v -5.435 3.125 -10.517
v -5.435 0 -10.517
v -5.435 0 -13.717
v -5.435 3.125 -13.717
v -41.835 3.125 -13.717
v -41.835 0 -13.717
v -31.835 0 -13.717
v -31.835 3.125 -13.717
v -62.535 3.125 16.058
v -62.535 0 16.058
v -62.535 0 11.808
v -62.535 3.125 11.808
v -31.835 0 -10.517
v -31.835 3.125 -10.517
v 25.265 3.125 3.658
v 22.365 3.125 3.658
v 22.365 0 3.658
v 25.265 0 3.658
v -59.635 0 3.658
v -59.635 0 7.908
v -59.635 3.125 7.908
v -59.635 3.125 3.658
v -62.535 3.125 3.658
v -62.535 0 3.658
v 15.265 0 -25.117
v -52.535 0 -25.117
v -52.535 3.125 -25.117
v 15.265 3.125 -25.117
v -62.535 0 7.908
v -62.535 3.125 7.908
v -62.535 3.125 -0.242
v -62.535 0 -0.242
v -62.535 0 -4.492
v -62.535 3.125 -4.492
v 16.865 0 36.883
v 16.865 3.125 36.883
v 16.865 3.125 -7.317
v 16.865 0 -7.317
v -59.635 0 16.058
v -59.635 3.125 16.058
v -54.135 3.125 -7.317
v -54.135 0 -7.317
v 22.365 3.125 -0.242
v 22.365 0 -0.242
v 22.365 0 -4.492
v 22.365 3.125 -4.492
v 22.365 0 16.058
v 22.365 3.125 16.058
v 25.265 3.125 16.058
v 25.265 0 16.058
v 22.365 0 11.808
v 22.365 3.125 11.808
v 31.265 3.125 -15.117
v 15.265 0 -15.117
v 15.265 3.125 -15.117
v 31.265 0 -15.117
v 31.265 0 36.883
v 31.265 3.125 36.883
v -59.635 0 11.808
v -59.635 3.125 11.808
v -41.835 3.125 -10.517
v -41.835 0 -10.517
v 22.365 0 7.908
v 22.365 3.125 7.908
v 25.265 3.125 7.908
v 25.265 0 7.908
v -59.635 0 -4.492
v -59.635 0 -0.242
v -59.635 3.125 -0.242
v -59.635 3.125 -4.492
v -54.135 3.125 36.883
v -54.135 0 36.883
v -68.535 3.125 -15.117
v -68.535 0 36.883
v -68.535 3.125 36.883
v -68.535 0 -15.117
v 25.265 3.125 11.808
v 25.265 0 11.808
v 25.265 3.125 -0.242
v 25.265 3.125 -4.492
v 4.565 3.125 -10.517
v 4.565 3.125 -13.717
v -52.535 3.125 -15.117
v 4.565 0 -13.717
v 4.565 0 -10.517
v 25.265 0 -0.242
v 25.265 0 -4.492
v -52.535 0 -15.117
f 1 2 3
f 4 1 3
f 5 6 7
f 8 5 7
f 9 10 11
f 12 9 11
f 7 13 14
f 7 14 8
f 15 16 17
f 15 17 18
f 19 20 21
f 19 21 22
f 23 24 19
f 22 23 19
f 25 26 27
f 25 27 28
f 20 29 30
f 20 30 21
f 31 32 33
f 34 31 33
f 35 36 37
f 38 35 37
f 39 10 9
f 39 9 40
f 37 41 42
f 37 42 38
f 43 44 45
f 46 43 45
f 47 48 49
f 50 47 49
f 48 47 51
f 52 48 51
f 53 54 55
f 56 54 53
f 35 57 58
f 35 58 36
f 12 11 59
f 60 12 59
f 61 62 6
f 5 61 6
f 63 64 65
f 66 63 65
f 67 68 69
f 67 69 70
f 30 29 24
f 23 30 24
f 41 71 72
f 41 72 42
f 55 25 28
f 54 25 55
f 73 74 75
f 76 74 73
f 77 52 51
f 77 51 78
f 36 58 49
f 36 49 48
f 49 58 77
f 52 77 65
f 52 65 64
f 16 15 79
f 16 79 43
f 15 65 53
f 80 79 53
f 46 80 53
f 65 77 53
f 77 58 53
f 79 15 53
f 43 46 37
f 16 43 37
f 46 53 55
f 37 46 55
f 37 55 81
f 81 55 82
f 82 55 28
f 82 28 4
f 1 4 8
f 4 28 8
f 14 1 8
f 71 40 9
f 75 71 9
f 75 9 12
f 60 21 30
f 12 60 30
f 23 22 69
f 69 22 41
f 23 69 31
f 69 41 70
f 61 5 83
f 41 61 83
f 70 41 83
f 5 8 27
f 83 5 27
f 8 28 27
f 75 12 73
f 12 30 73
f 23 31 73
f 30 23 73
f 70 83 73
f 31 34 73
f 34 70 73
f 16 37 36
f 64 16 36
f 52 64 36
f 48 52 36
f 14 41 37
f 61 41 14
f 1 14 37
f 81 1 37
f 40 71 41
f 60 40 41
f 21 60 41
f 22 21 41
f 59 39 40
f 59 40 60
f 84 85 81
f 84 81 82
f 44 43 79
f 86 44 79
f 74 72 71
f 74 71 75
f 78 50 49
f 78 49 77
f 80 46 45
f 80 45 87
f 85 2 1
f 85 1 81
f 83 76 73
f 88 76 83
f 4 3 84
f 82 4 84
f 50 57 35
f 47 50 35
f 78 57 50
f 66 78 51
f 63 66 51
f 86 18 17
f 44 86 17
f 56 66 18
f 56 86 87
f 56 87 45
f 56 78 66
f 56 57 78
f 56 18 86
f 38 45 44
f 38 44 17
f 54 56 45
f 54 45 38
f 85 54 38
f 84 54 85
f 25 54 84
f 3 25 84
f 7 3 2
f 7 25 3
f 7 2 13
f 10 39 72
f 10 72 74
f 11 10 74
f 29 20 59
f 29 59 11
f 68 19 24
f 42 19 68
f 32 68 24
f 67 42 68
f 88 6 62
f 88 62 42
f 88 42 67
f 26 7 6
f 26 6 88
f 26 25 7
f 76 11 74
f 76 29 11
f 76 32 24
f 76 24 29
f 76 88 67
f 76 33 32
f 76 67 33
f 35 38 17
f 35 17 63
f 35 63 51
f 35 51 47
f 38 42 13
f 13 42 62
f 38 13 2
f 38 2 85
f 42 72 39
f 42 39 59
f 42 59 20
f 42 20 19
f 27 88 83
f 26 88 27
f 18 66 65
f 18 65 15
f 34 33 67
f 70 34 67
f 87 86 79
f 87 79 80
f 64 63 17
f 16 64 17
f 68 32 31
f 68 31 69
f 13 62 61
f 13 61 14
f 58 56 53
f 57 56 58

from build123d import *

# Parameters (mm, degrees)
SKETCH1_W           = 2.9
SKETCH1_H           = 4.25
SKETCH1_W_2         = 10
SKETCH1_H_2         = 3.2
BOSS_EXTRUDE1_DEPTH = 3.125
SKETCH3_W           = 71
SKETCH3_H           = 44.2
CUT_EXTRUDE1_DEPTH  = 3.125


with BuildPart() as part:
    # Sketch1 → Boss-Extrude1 (new body)
    with BuildSketch(Plane(origin=(0, 0, 0), x_dir=(1, 0, 0), z_dir=(0, 1, 0))):
        Polygon((-68.534526854, 15.117391304), (-52.534526854, 15.117391304), (-52.534526854, 25.117391304), (15.265473146, 25.117391304), (15.265473146, 15.117391304), (31.265473146, 15.117391304), (31.265473146, -36.882608696), (-68.534526854, -36.882608696), align=None)
        with Locations((-61.084526854, 2.367391304)):
            Rectangle(SKETCH1_W, SKETCH1_H, mode=Mode.SUBTRACT)
        with Locations((-61.084526854, -5.782608696)):
            Rectangle(SKETCH1_W, SKETCH1_H, mode=Mode.SUBTRACT)
        with Locations((-61.084526854, -13.932608696)):
            Rectangle(SKETCH1_W, SKETCH1_H, mode=Mode.SUBTRACT)
        with Locations((23.815473146, 2.367391304)):
            Rectangle(SKETCH1_W, SKETCH1_H, mode=Mode.SUBTRACT)
        with Locations((23.815473146, -5.782608696)):
            Rectangle(SKETCH1_W, SKETCH1_H, mode=Mode.SUBTRACT)
        with Locations((23.815473146, -13.932608696)):
            Rectangle(SKETCH1_W, SKETCH1_H, mode=Mode.SUBTRACT)
        with Locations((-36.834526854, 12.117391304)):
            Rectangle(SKETCH1_W_2, SKETCH1_H_2, mode=Mode.SUBTRACT)
        with Locations((-0.434526854, 12.117391304)):
            Rectangle(SKETCH1_W_2, SKETCH1_H_2, mode=Mode.SUBTRACT)
    extrude(amount=BOSS_EXTRUDE1_DEPTH)

    # Sketch3 → Cut-Extrude1 (cut)
    with BuildSketch(Plane(origin=(0, 3.125, 0), x_dir=(1, 0, 0), z_dir=(0, 1, 0))):
        with Locations((-18.634526854, -14.782608696)):
            Rectangle(SKETCH3_W, SKETCH3_H)
    extrude(amount=-CUT_EXTRUDE1_DEPTH, mode=Mode.SUBTRACT)


solid = part.part
